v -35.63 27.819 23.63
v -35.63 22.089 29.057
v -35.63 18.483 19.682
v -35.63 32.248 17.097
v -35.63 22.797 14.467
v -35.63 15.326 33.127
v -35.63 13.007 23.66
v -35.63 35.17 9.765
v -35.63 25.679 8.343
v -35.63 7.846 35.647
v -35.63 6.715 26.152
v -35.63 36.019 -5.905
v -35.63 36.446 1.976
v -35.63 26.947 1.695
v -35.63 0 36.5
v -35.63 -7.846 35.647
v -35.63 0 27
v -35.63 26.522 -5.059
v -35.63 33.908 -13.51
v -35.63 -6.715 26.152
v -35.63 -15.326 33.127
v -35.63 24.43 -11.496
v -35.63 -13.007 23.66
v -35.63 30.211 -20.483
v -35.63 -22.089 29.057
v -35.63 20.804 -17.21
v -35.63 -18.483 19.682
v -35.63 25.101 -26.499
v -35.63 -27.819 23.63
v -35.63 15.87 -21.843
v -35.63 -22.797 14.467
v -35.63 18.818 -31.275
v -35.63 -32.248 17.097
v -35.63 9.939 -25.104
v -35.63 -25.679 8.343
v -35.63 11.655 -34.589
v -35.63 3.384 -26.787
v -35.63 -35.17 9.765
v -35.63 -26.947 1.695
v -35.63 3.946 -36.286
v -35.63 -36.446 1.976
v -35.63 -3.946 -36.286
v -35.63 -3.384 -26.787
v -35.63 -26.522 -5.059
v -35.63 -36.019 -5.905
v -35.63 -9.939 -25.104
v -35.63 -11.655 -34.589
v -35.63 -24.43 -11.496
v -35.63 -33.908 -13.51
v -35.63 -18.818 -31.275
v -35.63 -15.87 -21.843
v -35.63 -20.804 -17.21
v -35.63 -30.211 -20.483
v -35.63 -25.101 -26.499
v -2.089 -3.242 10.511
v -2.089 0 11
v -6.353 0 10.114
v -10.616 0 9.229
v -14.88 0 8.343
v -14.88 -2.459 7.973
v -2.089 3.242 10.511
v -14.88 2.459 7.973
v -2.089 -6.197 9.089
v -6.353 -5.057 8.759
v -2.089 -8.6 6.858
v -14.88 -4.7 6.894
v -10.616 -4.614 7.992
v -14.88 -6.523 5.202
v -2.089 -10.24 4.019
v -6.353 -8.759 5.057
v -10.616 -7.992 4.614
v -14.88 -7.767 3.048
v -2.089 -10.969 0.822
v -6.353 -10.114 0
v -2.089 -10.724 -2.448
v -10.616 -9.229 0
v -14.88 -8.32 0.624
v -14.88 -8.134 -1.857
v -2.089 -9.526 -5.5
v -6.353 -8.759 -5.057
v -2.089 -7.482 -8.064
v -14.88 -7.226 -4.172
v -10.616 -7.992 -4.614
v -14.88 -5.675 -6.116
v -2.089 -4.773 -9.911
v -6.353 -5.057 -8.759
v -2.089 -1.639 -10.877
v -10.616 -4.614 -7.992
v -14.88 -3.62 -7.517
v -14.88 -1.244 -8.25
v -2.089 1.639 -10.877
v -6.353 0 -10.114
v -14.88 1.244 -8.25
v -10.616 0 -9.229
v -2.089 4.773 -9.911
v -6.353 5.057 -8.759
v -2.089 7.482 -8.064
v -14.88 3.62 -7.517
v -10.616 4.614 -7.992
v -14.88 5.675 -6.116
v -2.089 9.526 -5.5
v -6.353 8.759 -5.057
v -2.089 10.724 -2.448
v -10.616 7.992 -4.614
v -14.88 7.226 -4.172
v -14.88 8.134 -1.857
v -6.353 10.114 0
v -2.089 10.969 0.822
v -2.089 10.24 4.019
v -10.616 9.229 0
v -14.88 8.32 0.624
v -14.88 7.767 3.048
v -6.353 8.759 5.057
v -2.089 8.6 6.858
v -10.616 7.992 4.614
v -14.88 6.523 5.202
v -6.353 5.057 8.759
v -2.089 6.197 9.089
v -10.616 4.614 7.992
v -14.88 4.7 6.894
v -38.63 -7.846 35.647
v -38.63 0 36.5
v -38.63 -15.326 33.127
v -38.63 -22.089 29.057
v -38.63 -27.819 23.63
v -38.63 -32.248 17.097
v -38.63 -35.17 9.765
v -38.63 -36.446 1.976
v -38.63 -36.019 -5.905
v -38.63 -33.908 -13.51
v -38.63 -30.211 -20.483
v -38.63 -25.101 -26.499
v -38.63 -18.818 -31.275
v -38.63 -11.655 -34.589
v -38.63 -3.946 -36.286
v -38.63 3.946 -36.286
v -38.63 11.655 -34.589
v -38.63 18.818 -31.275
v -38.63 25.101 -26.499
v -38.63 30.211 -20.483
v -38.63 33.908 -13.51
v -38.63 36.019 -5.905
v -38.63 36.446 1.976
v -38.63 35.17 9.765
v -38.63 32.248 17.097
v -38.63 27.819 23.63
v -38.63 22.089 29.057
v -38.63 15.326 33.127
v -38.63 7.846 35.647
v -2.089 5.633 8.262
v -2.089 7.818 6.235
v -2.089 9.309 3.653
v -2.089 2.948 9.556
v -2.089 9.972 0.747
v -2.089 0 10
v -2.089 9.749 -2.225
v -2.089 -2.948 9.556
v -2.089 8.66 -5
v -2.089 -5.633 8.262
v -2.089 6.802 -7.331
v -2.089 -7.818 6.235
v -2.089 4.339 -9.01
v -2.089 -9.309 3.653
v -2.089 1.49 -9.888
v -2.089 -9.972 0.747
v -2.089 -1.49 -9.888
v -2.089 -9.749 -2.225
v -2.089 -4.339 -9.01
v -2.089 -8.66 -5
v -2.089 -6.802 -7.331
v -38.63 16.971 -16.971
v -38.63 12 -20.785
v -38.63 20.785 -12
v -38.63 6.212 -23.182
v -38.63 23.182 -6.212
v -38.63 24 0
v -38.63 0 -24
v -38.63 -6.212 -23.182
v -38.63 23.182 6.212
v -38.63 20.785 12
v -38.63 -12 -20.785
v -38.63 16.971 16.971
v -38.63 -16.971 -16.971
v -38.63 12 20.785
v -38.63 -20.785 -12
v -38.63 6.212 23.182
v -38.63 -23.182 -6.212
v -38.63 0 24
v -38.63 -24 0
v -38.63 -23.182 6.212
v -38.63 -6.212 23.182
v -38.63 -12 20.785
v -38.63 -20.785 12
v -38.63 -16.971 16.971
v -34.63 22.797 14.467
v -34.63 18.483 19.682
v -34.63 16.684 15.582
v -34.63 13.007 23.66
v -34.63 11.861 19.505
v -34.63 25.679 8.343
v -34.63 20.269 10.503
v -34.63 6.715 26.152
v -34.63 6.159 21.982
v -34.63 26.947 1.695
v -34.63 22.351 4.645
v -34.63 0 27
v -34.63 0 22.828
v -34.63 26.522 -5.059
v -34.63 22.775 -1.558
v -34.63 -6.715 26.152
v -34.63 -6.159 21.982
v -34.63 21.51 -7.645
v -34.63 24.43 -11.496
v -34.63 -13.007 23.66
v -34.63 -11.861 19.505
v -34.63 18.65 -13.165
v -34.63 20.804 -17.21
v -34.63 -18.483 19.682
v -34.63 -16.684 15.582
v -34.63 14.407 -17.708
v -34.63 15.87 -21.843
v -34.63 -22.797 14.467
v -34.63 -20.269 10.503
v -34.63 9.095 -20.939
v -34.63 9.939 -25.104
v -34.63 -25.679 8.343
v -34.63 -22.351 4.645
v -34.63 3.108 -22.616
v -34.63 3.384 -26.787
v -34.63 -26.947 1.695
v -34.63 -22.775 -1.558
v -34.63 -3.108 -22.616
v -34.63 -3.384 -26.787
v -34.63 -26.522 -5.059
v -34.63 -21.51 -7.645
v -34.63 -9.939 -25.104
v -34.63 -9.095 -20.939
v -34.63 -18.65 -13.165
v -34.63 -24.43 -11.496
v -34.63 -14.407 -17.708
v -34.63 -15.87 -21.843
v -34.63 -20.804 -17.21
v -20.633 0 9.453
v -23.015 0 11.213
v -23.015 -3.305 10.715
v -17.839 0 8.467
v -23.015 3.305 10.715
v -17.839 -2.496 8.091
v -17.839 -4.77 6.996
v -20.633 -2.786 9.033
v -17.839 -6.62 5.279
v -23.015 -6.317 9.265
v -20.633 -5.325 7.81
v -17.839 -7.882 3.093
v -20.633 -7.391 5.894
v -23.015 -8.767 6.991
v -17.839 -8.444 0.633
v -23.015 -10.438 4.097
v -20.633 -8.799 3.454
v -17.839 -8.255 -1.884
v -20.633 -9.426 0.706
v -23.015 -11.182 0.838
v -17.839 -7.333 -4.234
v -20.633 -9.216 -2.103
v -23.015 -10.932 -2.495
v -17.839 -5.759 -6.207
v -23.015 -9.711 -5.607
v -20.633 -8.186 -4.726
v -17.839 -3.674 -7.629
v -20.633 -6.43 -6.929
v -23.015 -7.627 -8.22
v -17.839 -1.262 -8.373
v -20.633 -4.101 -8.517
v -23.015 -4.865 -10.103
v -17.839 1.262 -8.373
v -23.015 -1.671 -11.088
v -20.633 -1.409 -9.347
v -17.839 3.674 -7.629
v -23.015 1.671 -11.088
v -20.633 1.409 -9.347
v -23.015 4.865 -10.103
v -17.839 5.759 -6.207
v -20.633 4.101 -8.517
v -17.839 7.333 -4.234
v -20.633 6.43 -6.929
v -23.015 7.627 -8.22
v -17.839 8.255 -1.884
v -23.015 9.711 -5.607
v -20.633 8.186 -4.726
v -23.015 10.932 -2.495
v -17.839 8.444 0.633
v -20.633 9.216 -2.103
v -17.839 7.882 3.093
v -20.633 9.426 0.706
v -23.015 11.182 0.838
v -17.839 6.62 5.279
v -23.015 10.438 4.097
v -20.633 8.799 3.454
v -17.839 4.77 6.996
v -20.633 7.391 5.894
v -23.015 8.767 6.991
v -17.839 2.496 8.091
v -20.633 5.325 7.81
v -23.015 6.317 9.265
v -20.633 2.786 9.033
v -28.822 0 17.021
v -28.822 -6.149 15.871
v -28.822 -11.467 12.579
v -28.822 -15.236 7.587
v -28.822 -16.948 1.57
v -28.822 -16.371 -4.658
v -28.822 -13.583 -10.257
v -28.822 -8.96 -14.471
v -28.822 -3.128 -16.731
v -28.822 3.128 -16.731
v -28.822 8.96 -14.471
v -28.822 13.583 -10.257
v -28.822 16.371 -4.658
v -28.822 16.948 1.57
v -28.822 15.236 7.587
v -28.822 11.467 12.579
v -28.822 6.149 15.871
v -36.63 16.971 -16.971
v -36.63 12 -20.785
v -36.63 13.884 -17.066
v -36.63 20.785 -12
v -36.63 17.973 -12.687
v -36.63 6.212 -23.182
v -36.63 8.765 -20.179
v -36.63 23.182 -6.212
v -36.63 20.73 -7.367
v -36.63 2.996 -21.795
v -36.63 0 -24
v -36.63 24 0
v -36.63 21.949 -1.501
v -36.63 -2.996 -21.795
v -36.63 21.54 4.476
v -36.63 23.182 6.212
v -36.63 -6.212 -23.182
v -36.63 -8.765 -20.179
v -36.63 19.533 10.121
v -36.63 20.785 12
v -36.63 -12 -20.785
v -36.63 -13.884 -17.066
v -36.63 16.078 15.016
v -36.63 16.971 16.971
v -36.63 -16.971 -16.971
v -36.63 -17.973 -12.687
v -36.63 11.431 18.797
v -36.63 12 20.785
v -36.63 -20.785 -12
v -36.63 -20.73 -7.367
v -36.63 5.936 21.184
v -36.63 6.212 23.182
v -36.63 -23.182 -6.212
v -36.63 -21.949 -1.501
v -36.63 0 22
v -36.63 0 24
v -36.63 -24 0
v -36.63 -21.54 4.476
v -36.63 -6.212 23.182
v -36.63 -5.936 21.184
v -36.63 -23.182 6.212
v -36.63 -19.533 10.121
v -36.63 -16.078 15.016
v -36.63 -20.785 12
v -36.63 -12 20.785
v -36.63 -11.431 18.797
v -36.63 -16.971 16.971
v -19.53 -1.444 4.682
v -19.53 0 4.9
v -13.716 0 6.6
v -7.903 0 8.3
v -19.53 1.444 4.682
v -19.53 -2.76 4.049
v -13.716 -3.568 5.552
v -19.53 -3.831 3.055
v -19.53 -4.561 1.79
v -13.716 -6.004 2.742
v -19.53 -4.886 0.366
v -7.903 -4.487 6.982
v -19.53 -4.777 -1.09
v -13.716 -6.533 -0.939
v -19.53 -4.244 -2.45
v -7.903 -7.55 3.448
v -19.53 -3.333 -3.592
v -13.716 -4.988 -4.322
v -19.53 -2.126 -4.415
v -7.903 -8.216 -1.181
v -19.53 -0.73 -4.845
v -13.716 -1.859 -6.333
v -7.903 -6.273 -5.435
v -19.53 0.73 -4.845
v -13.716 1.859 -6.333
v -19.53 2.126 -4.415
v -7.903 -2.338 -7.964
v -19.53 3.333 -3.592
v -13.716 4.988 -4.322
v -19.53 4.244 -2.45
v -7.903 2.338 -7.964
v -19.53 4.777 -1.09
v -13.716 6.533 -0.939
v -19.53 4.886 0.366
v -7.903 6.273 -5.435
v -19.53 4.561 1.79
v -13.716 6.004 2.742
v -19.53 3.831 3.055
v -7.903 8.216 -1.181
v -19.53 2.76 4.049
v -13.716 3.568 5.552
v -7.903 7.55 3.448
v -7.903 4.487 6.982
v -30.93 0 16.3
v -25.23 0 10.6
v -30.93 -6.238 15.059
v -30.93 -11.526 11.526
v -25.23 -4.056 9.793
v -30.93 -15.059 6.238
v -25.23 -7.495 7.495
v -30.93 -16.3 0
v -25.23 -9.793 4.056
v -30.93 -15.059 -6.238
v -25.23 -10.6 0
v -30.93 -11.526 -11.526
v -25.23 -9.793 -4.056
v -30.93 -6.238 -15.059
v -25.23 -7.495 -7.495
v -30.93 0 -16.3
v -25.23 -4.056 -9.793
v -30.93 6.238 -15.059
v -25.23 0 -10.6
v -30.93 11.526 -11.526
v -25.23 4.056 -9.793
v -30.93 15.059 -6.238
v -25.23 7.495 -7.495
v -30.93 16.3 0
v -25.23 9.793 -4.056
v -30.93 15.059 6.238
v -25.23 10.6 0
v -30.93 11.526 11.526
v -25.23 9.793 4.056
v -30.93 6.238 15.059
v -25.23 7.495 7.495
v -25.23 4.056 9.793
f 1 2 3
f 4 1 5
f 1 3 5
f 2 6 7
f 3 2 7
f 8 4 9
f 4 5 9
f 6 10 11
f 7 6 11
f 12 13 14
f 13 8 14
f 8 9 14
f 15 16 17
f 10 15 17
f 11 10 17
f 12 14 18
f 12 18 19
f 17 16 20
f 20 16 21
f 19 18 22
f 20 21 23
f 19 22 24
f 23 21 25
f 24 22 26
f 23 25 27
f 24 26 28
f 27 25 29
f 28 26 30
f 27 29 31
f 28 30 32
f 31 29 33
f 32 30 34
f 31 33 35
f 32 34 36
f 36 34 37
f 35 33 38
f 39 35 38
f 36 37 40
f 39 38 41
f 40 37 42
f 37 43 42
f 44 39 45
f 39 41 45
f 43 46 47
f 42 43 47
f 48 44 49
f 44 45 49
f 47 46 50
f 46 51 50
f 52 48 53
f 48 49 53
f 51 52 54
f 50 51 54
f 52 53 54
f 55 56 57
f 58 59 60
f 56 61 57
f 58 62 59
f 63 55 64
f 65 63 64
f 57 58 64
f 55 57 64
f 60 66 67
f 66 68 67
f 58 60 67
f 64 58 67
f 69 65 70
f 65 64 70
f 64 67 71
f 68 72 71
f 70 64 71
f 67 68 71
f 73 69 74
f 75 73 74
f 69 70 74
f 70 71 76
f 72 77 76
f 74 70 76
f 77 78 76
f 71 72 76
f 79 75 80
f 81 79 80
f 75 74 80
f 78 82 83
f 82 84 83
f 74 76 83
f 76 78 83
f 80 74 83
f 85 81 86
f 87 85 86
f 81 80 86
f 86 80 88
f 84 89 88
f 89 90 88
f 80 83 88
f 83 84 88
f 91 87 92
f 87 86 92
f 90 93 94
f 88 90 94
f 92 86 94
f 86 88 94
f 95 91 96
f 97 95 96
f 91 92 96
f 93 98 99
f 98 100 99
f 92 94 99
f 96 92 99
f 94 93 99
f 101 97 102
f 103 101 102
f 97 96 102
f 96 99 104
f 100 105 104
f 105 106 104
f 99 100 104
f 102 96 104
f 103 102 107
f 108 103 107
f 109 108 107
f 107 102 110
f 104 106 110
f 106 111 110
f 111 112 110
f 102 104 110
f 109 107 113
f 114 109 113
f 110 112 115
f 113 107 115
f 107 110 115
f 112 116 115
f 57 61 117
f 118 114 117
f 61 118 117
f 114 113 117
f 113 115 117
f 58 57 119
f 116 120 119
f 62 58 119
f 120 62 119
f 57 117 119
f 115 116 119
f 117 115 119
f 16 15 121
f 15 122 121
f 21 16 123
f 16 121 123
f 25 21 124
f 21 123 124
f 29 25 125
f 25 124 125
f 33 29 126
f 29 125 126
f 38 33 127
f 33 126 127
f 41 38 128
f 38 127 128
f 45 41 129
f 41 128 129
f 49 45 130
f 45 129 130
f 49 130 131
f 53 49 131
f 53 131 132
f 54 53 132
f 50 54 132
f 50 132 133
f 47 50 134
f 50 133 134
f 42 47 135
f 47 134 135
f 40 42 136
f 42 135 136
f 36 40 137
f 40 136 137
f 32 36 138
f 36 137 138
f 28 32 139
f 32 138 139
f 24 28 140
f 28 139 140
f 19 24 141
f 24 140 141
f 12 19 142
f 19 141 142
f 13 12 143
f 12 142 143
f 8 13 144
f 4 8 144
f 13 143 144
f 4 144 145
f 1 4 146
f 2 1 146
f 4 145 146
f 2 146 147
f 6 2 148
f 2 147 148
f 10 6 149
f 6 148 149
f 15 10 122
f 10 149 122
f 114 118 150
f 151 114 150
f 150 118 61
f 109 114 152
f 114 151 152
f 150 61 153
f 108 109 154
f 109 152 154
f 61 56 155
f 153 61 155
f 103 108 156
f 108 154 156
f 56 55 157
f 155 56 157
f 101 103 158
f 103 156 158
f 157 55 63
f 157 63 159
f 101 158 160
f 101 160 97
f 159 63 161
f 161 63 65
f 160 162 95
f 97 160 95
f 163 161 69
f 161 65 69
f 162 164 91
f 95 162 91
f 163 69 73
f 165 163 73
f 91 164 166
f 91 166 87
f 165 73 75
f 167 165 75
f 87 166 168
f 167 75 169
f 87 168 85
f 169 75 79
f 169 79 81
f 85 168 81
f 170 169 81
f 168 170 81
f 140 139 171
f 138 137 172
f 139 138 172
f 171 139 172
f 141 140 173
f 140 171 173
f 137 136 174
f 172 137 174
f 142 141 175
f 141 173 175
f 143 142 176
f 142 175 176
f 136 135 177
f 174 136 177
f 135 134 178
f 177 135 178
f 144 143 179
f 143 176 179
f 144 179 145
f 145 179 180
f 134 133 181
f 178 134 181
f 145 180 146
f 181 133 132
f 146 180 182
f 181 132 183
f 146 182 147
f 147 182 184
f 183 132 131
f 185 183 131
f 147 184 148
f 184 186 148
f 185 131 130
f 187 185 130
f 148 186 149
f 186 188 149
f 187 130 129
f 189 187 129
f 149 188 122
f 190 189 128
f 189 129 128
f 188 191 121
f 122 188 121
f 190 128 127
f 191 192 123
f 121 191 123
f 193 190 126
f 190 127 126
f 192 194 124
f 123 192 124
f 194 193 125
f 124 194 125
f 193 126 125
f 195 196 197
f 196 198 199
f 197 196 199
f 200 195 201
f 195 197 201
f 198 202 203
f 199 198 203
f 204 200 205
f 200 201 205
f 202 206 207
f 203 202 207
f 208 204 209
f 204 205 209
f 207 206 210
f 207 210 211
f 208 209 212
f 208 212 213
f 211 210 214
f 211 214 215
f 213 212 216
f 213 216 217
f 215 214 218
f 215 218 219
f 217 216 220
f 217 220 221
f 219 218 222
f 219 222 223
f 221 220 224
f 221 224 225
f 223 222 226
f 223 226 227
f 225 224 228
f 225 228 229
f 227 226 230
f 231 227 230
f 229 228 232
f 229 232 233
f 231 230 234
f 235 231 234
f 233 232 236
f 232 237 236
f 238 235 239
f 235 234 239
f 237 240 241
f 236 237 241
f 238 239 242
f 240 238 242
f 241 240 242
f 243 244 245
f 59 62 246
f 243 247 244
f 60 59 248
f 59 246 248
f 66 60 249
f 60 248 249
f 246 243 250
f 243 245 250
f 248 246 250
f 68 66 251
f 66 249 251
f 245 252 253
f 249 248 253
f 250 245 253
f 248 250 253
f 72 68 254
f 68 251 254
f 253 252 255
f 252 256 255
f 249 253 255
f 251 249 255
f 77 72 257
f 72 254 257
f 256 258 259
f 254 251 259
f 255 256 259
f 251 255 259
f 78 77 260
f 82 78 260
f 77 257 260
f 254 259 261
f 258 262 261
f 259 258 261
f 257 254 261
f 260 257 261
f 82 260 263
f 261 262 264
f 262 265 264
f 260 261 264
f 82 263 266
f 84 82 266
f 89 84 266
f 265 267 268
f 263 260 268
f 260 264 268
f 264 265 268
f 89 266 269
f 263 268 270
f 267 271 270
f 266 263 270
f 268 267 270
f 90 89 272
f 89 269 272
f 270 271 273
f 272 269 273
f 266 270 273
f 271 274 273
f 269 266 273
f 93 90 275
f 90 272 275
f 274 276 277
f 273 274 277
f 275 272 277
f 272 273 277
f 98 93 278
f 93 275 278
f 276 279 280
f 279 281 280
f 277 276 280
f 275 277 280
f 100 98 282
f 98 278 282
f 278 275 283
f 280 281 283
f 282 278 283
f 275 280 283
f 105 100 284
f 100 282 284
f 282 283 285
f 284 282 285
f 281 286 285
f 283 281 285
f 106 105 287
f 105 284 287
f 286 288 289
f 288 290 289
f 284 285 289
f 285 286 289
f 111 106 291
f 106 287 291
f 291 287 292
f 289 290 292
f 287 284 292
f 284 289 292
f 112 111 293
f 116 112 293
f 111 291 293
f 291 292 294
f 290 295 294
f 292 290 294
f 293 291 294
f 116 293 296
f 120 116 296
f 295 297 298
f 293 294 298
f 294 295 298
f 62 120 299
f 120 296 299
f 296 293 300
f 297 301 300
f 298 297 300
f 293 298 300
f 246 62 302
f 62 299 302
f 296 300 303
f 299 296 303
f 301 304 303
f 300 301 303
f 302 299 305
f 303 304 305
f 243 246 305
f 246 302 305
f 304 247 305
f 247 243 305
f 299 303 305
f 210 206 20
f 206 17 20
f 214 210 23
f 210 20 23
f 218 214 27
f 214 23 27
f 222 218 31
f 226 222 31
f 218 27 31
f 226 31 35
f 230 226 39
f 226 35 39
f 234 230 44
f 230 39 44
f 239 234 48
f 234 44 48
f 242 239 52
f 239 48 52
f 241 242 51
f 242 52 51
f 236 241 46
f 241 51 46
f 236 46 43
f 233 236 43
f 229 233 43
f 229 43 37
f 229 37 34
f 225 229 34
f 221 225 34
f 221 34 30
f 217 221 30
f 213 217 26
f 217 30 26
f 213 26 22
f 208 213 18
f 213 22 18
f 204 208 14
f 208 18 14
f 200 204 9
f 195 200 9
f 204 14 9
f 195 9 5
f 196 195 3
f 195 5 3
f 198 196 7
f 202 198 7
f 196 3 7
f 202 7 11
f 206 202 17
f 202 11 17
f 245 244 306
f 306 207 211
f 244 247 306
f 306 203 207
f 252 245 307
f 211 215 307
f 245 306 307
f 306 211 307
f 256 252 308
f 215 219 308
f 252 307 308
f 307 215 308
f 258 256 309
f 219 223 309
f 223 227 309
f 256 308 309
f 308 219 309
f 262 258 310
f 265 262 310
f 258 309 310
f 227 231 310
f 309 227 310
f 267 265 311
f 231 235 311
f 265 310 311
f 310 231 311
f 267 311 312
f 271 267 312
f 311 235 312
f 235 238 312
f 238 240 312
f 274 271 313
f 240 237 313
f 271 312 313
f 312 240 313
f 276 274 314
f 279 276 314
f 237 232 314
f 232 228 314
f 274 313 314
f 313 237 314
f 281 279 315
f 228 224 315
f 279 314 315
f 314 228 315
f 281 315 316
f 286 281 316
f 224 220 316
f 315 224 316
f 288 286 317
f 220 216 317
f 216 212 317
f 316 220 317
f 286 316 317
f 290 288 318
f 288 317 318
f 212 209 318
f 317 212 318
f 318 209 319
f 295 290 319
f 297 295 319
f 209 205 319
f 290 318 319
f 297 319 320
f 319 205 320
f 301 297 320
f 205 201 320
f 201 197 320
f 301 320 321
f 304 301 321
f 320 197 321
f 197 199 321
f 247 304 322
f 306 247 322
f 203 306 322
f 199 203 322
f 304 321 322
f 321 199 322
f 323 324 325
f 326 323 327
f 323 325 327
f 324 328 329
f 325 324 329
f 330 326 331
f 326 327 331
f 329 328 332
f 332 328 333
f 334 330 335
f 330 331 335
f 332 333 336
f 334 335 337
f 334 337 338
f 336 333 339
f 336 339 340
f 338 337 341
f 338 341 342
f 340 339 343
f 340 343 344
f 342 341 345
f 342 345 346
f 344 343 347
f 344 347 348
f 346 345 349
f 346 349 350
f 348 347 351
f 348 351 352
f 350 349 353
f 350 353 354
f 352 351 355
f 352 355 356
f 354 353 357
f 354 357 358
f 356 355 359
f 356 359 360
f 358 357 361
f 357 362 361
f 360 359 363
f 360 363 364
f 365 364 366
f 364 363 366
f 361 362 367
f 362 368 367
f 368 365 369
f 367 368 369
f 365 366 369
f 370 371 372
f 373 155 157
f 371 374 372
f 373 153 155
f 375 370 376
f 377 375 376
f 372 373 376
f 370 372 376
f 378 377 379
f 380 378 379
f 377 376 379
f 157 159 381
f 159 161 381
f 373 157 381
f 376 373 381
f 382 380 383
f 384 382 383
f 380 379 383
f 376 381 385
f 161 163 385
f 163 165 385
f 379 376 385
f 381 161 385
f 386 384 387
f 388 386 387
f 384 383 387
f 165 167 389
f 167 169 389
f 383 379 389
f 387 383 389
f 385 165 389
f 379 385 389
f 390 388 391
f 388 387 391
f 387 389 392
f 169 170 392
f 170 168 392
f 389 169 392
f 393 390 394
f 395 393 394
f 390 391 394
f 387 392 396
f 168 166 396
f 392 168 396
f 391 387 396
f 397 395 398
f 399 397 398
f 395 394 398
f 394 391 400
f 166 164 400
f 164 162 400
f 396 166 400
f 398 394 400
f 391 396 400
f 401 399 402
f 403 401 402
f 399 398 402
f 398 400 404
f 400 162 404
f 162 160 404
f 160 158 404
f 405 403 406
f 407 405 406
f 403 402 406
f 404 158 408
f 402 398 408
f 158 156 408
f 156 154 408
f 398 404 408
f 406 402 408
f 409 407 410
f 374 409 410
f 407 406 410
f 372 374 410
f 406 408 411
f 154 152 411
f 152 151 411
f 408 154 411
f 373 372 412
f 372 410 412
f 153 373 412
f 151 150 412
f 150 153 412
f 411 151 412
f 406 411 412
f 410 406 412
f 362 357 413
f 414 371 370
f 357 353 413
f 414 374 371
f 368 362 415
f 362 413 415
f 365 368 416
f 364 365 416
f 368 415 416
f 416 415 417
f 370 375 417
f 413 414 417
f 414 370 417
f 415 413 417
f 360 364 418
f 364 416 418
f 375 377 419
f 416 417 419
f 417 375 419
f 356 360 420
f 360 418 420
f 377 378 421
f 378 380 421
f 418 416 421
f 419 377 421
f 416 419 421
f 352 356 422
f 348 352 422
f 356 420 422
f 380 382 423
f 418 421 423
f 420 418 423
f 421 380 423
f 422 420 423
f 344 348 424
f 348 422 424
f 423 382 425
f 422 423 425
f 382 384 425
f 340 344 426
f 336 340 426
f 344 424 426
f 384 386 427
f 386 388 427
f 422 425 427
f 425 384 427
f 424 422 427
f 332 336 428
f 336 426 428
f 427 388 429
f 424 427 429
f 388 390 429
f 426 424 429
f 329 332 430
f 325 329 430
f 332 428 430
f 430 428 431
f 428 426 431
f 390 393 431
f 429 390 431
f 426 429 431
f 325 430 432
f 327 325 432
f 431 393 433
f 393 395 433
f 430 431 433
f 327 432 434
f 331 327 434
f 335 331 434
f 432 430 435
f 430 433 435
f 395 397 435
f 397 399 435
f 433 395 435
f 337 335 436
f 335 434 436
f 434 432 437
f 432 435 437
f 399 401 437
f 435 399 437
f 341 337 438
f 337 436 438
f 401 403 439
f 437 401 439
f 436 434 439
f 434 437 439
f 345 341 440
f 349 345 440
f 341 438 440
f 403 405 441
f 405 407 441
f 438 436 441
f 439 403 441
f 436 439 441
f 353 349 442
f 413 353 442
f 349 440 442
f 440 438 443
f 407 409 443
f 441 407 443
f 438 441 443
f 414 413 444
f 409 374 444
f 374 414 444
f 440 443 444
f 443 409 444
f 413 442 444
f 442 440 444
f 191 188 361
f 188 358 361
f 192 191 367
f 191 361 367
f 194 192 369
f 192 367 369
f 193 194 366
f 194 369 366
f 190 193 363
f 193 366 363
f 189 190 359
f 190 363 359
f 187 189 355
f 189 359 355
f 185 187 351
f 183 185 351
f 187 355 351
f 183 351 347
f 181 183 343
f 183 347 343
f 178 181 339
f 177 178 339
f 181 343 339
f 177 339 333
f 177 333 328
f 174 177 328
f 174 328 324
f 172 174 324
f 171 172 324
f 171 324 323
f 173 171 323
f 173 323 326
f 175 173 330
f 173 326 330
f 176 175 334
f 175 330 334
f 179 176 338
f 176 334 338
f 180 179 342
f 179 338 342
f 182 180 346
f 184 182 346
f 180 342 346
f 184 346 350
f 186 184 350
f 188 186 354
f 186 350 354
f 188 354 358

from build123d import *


with BuildPart() as part:
    # Esboço2 → revolução (revolve)
    with BuildSketch(Plane.XY, mode=Mode.PRIVATE) as revolu_o_sk:
        with BuildLine():
            Line((-38.630060783, 24), (-36.630060783, 24))
            Line((-36.630060783, 24), (-36.630060783, 22))
            Line((-36.630060783, 22), (-19.529700637, 4.9))
            Line((-19.529700637, 4.9), (-2.089060783, 10))
            Line((-2.089060783, 10), (-2.089060783, 11))
            Line((-2.089060783, 11), (-14.880094771, 8.343395867))
            ThreePointArc((-14.880094771, 8.343395867), (-19.272729764, 8.856141459), (-23.014659232, 11.21328254))
            Line((-23.014659232, 11.21328254), (-34.630060783, 22.828439462))
            Line((-34.630060783, 22.828439462), (-34.630060783, 27))
            Line((-34.630060783, 27), (-35.630060783, 27))
            Line((-35.630060783, 27), (-35.630060783, 36.5))
            Line((-35.630060783, 36.5), (-38.630060783, 36.5))
            Line((-38.630060783, 36.5), (-38.630060783, 24))
        make_face()
    revolve(revolu_o_sk.sketch.rotate(Axis((-109.349560783, 0, 0), (1, 0, 0)), 90), axis=Axis((-109.349560783, 0, 0), (1, 0, 0)))


solid = part.part
